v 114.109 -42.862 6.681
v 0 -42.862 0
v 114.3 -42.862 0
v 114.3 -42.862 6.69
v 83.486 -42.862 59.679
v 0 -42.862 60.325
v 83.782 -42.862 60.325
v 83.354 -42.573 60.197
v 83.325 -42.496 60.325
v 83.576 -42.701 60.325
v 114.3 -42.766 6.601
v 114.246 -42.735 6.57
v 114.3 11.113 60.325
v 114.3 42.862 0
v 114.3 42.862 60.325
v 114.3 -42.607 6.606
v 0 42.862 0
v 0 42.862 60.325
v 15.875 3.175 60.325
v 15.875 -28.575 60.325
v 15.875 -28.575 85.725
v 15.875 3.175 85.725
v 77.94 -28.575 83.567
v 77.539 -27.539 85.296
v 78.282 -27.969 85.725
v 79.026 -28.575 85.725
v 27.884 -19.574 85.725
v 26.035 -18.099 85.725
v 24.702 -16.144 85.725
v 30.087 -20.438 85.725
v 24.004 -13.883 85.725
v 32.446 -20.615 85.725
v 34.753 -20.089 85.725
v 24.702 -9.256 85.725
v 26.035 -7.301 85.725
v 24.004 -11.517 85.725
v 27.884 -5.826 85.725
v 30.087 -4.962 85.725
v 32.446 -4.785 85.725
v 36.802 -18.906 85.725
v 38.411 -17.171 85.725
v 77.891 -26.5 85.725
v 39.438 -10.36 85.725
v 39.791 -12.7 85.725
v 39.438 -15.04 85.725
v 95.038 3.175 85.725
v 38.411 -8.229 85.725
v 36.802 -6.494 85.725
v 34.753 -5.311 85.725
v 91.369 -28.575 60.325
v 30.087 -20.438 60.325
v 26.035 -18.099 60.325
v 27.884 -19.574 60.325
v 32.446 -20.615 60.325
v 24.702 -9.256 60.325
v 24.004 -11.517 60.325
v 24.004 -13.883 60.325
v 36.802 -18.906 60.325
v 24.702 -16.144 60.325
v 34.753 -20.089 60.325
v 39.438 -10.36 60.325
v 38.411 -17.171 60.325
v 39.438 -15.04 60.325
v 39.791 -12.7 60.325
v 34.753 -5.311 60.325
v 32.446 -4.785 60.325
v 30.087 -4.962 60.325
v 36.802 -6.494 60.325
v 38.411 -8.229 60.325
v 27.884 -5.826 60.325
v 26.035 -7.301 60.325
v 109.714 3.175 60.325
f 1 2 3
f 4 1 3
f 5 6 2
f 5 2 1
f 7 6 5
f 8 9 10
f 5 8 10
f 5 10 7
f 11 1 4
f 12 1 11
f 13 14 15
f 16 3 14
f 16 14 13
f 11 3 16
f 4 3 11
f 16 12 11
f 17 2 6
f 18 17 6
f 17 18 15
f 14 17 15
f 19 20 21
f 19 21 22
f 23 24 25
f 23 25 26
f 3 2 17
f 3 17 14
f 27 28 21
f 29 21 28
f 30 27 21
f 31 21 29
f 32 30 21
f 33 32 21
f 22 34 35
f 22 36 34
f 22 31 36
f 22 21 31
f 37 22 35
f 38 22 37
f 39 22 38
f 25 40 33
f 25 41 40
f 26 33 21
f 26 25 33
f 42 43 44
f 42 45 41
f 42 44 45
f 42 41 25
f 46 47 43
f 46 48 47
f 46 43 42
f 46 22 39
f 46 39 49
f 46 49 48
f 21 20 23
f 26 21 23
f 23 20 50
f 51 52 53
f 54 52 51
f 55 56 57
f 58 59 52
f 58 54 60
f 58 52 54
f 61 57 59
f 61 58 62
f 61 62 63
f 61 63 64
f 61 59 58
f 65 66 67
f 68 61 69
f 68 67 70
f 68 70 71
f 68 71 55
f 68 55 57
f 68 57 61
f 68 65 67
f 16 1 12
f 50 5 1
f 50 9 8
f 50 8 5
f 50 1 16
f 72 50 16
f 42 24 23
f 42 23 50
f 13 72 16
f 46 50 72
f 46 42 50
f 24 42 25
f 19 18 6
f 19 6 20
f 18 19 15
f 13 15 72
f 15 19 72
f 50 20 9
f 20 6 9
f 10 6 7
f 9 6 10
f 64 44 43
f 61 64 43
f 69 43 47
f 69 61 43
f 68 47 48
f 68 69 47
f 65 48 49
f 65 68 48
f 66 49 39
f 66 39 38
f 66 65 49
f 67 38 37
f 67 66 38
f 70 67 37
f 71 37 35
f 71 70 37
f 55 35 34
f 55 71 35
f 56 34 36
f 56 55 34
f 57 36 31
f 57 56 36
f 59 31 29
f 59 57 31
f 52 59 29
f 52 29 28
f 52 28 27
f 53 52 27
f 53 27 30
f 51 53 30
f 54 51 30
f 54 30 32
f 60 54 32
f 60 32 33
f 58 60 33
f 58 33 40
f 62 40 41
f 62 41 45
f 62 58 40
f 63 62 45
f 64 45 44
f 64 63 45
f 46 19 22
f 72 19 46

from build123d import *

# Parameters (mm, degrees)
F0_W      = 114.3
F0_H      = 60.325
F1_DEPTH  = 42.8625
F2_W      = 98.425
F2_H      = 31.75
F3_DEPTH  = 25.4
F4_R      = 7.9375
F5_DEPTH  = 25.4
F10_DEPTH = 127


with BuildPart() as f1:
    # F0 (on Front) → F1 (new body, symmetric)
    with BuildSketch(Plane.XZ):
        with Locations((57.15, 30.1625)):
            Rectangle(F0_W, F0_H)
    extrude(amount=F1_DEPTH, both=True)

    # F2 (on face) → F3 (join)
    with BuildSketch(Plane.XY.offset(60.325)):
        with Locations((65.0875, -12.7)):
            Rectangle(F2_W, F2_H)
    extrude(amount=F3_DEPTH)

    # F4 (on face) → F5 (cut)
    with BuildSketch(Plane.XY.offset(60.325)):
        with Locations((31.8531343792, -12.7)):
            Circle(F4_R)
    extrude(amount=F5_DEPTH, mode=Mode.SUBTRACT)

    # F9 (on 3pt) → F10 (cut)
    with BuildSketch(Plane(origin=(85.5876450588, -49.4525301974, 49.4525301974), x_dir=(0.3874037681, 0.8943227315, 0.2238418469), z_dir=(0.7743554069, -0.4474224535, 0.4474224535))):
        Polygon((-14.9042876437, -25.4722796381), (7.5109787285, -51.4674633741), (114.2435371876, -48.7483553588), (131.361335516, 53.0414171517), (24.5024245232, 35.0616015494), (7.6925121248, 10.4205505922), align=None)
    extrude(amount=F10_DEPTH, mode=Mode.SUBTRACT)


solid = f1.part
